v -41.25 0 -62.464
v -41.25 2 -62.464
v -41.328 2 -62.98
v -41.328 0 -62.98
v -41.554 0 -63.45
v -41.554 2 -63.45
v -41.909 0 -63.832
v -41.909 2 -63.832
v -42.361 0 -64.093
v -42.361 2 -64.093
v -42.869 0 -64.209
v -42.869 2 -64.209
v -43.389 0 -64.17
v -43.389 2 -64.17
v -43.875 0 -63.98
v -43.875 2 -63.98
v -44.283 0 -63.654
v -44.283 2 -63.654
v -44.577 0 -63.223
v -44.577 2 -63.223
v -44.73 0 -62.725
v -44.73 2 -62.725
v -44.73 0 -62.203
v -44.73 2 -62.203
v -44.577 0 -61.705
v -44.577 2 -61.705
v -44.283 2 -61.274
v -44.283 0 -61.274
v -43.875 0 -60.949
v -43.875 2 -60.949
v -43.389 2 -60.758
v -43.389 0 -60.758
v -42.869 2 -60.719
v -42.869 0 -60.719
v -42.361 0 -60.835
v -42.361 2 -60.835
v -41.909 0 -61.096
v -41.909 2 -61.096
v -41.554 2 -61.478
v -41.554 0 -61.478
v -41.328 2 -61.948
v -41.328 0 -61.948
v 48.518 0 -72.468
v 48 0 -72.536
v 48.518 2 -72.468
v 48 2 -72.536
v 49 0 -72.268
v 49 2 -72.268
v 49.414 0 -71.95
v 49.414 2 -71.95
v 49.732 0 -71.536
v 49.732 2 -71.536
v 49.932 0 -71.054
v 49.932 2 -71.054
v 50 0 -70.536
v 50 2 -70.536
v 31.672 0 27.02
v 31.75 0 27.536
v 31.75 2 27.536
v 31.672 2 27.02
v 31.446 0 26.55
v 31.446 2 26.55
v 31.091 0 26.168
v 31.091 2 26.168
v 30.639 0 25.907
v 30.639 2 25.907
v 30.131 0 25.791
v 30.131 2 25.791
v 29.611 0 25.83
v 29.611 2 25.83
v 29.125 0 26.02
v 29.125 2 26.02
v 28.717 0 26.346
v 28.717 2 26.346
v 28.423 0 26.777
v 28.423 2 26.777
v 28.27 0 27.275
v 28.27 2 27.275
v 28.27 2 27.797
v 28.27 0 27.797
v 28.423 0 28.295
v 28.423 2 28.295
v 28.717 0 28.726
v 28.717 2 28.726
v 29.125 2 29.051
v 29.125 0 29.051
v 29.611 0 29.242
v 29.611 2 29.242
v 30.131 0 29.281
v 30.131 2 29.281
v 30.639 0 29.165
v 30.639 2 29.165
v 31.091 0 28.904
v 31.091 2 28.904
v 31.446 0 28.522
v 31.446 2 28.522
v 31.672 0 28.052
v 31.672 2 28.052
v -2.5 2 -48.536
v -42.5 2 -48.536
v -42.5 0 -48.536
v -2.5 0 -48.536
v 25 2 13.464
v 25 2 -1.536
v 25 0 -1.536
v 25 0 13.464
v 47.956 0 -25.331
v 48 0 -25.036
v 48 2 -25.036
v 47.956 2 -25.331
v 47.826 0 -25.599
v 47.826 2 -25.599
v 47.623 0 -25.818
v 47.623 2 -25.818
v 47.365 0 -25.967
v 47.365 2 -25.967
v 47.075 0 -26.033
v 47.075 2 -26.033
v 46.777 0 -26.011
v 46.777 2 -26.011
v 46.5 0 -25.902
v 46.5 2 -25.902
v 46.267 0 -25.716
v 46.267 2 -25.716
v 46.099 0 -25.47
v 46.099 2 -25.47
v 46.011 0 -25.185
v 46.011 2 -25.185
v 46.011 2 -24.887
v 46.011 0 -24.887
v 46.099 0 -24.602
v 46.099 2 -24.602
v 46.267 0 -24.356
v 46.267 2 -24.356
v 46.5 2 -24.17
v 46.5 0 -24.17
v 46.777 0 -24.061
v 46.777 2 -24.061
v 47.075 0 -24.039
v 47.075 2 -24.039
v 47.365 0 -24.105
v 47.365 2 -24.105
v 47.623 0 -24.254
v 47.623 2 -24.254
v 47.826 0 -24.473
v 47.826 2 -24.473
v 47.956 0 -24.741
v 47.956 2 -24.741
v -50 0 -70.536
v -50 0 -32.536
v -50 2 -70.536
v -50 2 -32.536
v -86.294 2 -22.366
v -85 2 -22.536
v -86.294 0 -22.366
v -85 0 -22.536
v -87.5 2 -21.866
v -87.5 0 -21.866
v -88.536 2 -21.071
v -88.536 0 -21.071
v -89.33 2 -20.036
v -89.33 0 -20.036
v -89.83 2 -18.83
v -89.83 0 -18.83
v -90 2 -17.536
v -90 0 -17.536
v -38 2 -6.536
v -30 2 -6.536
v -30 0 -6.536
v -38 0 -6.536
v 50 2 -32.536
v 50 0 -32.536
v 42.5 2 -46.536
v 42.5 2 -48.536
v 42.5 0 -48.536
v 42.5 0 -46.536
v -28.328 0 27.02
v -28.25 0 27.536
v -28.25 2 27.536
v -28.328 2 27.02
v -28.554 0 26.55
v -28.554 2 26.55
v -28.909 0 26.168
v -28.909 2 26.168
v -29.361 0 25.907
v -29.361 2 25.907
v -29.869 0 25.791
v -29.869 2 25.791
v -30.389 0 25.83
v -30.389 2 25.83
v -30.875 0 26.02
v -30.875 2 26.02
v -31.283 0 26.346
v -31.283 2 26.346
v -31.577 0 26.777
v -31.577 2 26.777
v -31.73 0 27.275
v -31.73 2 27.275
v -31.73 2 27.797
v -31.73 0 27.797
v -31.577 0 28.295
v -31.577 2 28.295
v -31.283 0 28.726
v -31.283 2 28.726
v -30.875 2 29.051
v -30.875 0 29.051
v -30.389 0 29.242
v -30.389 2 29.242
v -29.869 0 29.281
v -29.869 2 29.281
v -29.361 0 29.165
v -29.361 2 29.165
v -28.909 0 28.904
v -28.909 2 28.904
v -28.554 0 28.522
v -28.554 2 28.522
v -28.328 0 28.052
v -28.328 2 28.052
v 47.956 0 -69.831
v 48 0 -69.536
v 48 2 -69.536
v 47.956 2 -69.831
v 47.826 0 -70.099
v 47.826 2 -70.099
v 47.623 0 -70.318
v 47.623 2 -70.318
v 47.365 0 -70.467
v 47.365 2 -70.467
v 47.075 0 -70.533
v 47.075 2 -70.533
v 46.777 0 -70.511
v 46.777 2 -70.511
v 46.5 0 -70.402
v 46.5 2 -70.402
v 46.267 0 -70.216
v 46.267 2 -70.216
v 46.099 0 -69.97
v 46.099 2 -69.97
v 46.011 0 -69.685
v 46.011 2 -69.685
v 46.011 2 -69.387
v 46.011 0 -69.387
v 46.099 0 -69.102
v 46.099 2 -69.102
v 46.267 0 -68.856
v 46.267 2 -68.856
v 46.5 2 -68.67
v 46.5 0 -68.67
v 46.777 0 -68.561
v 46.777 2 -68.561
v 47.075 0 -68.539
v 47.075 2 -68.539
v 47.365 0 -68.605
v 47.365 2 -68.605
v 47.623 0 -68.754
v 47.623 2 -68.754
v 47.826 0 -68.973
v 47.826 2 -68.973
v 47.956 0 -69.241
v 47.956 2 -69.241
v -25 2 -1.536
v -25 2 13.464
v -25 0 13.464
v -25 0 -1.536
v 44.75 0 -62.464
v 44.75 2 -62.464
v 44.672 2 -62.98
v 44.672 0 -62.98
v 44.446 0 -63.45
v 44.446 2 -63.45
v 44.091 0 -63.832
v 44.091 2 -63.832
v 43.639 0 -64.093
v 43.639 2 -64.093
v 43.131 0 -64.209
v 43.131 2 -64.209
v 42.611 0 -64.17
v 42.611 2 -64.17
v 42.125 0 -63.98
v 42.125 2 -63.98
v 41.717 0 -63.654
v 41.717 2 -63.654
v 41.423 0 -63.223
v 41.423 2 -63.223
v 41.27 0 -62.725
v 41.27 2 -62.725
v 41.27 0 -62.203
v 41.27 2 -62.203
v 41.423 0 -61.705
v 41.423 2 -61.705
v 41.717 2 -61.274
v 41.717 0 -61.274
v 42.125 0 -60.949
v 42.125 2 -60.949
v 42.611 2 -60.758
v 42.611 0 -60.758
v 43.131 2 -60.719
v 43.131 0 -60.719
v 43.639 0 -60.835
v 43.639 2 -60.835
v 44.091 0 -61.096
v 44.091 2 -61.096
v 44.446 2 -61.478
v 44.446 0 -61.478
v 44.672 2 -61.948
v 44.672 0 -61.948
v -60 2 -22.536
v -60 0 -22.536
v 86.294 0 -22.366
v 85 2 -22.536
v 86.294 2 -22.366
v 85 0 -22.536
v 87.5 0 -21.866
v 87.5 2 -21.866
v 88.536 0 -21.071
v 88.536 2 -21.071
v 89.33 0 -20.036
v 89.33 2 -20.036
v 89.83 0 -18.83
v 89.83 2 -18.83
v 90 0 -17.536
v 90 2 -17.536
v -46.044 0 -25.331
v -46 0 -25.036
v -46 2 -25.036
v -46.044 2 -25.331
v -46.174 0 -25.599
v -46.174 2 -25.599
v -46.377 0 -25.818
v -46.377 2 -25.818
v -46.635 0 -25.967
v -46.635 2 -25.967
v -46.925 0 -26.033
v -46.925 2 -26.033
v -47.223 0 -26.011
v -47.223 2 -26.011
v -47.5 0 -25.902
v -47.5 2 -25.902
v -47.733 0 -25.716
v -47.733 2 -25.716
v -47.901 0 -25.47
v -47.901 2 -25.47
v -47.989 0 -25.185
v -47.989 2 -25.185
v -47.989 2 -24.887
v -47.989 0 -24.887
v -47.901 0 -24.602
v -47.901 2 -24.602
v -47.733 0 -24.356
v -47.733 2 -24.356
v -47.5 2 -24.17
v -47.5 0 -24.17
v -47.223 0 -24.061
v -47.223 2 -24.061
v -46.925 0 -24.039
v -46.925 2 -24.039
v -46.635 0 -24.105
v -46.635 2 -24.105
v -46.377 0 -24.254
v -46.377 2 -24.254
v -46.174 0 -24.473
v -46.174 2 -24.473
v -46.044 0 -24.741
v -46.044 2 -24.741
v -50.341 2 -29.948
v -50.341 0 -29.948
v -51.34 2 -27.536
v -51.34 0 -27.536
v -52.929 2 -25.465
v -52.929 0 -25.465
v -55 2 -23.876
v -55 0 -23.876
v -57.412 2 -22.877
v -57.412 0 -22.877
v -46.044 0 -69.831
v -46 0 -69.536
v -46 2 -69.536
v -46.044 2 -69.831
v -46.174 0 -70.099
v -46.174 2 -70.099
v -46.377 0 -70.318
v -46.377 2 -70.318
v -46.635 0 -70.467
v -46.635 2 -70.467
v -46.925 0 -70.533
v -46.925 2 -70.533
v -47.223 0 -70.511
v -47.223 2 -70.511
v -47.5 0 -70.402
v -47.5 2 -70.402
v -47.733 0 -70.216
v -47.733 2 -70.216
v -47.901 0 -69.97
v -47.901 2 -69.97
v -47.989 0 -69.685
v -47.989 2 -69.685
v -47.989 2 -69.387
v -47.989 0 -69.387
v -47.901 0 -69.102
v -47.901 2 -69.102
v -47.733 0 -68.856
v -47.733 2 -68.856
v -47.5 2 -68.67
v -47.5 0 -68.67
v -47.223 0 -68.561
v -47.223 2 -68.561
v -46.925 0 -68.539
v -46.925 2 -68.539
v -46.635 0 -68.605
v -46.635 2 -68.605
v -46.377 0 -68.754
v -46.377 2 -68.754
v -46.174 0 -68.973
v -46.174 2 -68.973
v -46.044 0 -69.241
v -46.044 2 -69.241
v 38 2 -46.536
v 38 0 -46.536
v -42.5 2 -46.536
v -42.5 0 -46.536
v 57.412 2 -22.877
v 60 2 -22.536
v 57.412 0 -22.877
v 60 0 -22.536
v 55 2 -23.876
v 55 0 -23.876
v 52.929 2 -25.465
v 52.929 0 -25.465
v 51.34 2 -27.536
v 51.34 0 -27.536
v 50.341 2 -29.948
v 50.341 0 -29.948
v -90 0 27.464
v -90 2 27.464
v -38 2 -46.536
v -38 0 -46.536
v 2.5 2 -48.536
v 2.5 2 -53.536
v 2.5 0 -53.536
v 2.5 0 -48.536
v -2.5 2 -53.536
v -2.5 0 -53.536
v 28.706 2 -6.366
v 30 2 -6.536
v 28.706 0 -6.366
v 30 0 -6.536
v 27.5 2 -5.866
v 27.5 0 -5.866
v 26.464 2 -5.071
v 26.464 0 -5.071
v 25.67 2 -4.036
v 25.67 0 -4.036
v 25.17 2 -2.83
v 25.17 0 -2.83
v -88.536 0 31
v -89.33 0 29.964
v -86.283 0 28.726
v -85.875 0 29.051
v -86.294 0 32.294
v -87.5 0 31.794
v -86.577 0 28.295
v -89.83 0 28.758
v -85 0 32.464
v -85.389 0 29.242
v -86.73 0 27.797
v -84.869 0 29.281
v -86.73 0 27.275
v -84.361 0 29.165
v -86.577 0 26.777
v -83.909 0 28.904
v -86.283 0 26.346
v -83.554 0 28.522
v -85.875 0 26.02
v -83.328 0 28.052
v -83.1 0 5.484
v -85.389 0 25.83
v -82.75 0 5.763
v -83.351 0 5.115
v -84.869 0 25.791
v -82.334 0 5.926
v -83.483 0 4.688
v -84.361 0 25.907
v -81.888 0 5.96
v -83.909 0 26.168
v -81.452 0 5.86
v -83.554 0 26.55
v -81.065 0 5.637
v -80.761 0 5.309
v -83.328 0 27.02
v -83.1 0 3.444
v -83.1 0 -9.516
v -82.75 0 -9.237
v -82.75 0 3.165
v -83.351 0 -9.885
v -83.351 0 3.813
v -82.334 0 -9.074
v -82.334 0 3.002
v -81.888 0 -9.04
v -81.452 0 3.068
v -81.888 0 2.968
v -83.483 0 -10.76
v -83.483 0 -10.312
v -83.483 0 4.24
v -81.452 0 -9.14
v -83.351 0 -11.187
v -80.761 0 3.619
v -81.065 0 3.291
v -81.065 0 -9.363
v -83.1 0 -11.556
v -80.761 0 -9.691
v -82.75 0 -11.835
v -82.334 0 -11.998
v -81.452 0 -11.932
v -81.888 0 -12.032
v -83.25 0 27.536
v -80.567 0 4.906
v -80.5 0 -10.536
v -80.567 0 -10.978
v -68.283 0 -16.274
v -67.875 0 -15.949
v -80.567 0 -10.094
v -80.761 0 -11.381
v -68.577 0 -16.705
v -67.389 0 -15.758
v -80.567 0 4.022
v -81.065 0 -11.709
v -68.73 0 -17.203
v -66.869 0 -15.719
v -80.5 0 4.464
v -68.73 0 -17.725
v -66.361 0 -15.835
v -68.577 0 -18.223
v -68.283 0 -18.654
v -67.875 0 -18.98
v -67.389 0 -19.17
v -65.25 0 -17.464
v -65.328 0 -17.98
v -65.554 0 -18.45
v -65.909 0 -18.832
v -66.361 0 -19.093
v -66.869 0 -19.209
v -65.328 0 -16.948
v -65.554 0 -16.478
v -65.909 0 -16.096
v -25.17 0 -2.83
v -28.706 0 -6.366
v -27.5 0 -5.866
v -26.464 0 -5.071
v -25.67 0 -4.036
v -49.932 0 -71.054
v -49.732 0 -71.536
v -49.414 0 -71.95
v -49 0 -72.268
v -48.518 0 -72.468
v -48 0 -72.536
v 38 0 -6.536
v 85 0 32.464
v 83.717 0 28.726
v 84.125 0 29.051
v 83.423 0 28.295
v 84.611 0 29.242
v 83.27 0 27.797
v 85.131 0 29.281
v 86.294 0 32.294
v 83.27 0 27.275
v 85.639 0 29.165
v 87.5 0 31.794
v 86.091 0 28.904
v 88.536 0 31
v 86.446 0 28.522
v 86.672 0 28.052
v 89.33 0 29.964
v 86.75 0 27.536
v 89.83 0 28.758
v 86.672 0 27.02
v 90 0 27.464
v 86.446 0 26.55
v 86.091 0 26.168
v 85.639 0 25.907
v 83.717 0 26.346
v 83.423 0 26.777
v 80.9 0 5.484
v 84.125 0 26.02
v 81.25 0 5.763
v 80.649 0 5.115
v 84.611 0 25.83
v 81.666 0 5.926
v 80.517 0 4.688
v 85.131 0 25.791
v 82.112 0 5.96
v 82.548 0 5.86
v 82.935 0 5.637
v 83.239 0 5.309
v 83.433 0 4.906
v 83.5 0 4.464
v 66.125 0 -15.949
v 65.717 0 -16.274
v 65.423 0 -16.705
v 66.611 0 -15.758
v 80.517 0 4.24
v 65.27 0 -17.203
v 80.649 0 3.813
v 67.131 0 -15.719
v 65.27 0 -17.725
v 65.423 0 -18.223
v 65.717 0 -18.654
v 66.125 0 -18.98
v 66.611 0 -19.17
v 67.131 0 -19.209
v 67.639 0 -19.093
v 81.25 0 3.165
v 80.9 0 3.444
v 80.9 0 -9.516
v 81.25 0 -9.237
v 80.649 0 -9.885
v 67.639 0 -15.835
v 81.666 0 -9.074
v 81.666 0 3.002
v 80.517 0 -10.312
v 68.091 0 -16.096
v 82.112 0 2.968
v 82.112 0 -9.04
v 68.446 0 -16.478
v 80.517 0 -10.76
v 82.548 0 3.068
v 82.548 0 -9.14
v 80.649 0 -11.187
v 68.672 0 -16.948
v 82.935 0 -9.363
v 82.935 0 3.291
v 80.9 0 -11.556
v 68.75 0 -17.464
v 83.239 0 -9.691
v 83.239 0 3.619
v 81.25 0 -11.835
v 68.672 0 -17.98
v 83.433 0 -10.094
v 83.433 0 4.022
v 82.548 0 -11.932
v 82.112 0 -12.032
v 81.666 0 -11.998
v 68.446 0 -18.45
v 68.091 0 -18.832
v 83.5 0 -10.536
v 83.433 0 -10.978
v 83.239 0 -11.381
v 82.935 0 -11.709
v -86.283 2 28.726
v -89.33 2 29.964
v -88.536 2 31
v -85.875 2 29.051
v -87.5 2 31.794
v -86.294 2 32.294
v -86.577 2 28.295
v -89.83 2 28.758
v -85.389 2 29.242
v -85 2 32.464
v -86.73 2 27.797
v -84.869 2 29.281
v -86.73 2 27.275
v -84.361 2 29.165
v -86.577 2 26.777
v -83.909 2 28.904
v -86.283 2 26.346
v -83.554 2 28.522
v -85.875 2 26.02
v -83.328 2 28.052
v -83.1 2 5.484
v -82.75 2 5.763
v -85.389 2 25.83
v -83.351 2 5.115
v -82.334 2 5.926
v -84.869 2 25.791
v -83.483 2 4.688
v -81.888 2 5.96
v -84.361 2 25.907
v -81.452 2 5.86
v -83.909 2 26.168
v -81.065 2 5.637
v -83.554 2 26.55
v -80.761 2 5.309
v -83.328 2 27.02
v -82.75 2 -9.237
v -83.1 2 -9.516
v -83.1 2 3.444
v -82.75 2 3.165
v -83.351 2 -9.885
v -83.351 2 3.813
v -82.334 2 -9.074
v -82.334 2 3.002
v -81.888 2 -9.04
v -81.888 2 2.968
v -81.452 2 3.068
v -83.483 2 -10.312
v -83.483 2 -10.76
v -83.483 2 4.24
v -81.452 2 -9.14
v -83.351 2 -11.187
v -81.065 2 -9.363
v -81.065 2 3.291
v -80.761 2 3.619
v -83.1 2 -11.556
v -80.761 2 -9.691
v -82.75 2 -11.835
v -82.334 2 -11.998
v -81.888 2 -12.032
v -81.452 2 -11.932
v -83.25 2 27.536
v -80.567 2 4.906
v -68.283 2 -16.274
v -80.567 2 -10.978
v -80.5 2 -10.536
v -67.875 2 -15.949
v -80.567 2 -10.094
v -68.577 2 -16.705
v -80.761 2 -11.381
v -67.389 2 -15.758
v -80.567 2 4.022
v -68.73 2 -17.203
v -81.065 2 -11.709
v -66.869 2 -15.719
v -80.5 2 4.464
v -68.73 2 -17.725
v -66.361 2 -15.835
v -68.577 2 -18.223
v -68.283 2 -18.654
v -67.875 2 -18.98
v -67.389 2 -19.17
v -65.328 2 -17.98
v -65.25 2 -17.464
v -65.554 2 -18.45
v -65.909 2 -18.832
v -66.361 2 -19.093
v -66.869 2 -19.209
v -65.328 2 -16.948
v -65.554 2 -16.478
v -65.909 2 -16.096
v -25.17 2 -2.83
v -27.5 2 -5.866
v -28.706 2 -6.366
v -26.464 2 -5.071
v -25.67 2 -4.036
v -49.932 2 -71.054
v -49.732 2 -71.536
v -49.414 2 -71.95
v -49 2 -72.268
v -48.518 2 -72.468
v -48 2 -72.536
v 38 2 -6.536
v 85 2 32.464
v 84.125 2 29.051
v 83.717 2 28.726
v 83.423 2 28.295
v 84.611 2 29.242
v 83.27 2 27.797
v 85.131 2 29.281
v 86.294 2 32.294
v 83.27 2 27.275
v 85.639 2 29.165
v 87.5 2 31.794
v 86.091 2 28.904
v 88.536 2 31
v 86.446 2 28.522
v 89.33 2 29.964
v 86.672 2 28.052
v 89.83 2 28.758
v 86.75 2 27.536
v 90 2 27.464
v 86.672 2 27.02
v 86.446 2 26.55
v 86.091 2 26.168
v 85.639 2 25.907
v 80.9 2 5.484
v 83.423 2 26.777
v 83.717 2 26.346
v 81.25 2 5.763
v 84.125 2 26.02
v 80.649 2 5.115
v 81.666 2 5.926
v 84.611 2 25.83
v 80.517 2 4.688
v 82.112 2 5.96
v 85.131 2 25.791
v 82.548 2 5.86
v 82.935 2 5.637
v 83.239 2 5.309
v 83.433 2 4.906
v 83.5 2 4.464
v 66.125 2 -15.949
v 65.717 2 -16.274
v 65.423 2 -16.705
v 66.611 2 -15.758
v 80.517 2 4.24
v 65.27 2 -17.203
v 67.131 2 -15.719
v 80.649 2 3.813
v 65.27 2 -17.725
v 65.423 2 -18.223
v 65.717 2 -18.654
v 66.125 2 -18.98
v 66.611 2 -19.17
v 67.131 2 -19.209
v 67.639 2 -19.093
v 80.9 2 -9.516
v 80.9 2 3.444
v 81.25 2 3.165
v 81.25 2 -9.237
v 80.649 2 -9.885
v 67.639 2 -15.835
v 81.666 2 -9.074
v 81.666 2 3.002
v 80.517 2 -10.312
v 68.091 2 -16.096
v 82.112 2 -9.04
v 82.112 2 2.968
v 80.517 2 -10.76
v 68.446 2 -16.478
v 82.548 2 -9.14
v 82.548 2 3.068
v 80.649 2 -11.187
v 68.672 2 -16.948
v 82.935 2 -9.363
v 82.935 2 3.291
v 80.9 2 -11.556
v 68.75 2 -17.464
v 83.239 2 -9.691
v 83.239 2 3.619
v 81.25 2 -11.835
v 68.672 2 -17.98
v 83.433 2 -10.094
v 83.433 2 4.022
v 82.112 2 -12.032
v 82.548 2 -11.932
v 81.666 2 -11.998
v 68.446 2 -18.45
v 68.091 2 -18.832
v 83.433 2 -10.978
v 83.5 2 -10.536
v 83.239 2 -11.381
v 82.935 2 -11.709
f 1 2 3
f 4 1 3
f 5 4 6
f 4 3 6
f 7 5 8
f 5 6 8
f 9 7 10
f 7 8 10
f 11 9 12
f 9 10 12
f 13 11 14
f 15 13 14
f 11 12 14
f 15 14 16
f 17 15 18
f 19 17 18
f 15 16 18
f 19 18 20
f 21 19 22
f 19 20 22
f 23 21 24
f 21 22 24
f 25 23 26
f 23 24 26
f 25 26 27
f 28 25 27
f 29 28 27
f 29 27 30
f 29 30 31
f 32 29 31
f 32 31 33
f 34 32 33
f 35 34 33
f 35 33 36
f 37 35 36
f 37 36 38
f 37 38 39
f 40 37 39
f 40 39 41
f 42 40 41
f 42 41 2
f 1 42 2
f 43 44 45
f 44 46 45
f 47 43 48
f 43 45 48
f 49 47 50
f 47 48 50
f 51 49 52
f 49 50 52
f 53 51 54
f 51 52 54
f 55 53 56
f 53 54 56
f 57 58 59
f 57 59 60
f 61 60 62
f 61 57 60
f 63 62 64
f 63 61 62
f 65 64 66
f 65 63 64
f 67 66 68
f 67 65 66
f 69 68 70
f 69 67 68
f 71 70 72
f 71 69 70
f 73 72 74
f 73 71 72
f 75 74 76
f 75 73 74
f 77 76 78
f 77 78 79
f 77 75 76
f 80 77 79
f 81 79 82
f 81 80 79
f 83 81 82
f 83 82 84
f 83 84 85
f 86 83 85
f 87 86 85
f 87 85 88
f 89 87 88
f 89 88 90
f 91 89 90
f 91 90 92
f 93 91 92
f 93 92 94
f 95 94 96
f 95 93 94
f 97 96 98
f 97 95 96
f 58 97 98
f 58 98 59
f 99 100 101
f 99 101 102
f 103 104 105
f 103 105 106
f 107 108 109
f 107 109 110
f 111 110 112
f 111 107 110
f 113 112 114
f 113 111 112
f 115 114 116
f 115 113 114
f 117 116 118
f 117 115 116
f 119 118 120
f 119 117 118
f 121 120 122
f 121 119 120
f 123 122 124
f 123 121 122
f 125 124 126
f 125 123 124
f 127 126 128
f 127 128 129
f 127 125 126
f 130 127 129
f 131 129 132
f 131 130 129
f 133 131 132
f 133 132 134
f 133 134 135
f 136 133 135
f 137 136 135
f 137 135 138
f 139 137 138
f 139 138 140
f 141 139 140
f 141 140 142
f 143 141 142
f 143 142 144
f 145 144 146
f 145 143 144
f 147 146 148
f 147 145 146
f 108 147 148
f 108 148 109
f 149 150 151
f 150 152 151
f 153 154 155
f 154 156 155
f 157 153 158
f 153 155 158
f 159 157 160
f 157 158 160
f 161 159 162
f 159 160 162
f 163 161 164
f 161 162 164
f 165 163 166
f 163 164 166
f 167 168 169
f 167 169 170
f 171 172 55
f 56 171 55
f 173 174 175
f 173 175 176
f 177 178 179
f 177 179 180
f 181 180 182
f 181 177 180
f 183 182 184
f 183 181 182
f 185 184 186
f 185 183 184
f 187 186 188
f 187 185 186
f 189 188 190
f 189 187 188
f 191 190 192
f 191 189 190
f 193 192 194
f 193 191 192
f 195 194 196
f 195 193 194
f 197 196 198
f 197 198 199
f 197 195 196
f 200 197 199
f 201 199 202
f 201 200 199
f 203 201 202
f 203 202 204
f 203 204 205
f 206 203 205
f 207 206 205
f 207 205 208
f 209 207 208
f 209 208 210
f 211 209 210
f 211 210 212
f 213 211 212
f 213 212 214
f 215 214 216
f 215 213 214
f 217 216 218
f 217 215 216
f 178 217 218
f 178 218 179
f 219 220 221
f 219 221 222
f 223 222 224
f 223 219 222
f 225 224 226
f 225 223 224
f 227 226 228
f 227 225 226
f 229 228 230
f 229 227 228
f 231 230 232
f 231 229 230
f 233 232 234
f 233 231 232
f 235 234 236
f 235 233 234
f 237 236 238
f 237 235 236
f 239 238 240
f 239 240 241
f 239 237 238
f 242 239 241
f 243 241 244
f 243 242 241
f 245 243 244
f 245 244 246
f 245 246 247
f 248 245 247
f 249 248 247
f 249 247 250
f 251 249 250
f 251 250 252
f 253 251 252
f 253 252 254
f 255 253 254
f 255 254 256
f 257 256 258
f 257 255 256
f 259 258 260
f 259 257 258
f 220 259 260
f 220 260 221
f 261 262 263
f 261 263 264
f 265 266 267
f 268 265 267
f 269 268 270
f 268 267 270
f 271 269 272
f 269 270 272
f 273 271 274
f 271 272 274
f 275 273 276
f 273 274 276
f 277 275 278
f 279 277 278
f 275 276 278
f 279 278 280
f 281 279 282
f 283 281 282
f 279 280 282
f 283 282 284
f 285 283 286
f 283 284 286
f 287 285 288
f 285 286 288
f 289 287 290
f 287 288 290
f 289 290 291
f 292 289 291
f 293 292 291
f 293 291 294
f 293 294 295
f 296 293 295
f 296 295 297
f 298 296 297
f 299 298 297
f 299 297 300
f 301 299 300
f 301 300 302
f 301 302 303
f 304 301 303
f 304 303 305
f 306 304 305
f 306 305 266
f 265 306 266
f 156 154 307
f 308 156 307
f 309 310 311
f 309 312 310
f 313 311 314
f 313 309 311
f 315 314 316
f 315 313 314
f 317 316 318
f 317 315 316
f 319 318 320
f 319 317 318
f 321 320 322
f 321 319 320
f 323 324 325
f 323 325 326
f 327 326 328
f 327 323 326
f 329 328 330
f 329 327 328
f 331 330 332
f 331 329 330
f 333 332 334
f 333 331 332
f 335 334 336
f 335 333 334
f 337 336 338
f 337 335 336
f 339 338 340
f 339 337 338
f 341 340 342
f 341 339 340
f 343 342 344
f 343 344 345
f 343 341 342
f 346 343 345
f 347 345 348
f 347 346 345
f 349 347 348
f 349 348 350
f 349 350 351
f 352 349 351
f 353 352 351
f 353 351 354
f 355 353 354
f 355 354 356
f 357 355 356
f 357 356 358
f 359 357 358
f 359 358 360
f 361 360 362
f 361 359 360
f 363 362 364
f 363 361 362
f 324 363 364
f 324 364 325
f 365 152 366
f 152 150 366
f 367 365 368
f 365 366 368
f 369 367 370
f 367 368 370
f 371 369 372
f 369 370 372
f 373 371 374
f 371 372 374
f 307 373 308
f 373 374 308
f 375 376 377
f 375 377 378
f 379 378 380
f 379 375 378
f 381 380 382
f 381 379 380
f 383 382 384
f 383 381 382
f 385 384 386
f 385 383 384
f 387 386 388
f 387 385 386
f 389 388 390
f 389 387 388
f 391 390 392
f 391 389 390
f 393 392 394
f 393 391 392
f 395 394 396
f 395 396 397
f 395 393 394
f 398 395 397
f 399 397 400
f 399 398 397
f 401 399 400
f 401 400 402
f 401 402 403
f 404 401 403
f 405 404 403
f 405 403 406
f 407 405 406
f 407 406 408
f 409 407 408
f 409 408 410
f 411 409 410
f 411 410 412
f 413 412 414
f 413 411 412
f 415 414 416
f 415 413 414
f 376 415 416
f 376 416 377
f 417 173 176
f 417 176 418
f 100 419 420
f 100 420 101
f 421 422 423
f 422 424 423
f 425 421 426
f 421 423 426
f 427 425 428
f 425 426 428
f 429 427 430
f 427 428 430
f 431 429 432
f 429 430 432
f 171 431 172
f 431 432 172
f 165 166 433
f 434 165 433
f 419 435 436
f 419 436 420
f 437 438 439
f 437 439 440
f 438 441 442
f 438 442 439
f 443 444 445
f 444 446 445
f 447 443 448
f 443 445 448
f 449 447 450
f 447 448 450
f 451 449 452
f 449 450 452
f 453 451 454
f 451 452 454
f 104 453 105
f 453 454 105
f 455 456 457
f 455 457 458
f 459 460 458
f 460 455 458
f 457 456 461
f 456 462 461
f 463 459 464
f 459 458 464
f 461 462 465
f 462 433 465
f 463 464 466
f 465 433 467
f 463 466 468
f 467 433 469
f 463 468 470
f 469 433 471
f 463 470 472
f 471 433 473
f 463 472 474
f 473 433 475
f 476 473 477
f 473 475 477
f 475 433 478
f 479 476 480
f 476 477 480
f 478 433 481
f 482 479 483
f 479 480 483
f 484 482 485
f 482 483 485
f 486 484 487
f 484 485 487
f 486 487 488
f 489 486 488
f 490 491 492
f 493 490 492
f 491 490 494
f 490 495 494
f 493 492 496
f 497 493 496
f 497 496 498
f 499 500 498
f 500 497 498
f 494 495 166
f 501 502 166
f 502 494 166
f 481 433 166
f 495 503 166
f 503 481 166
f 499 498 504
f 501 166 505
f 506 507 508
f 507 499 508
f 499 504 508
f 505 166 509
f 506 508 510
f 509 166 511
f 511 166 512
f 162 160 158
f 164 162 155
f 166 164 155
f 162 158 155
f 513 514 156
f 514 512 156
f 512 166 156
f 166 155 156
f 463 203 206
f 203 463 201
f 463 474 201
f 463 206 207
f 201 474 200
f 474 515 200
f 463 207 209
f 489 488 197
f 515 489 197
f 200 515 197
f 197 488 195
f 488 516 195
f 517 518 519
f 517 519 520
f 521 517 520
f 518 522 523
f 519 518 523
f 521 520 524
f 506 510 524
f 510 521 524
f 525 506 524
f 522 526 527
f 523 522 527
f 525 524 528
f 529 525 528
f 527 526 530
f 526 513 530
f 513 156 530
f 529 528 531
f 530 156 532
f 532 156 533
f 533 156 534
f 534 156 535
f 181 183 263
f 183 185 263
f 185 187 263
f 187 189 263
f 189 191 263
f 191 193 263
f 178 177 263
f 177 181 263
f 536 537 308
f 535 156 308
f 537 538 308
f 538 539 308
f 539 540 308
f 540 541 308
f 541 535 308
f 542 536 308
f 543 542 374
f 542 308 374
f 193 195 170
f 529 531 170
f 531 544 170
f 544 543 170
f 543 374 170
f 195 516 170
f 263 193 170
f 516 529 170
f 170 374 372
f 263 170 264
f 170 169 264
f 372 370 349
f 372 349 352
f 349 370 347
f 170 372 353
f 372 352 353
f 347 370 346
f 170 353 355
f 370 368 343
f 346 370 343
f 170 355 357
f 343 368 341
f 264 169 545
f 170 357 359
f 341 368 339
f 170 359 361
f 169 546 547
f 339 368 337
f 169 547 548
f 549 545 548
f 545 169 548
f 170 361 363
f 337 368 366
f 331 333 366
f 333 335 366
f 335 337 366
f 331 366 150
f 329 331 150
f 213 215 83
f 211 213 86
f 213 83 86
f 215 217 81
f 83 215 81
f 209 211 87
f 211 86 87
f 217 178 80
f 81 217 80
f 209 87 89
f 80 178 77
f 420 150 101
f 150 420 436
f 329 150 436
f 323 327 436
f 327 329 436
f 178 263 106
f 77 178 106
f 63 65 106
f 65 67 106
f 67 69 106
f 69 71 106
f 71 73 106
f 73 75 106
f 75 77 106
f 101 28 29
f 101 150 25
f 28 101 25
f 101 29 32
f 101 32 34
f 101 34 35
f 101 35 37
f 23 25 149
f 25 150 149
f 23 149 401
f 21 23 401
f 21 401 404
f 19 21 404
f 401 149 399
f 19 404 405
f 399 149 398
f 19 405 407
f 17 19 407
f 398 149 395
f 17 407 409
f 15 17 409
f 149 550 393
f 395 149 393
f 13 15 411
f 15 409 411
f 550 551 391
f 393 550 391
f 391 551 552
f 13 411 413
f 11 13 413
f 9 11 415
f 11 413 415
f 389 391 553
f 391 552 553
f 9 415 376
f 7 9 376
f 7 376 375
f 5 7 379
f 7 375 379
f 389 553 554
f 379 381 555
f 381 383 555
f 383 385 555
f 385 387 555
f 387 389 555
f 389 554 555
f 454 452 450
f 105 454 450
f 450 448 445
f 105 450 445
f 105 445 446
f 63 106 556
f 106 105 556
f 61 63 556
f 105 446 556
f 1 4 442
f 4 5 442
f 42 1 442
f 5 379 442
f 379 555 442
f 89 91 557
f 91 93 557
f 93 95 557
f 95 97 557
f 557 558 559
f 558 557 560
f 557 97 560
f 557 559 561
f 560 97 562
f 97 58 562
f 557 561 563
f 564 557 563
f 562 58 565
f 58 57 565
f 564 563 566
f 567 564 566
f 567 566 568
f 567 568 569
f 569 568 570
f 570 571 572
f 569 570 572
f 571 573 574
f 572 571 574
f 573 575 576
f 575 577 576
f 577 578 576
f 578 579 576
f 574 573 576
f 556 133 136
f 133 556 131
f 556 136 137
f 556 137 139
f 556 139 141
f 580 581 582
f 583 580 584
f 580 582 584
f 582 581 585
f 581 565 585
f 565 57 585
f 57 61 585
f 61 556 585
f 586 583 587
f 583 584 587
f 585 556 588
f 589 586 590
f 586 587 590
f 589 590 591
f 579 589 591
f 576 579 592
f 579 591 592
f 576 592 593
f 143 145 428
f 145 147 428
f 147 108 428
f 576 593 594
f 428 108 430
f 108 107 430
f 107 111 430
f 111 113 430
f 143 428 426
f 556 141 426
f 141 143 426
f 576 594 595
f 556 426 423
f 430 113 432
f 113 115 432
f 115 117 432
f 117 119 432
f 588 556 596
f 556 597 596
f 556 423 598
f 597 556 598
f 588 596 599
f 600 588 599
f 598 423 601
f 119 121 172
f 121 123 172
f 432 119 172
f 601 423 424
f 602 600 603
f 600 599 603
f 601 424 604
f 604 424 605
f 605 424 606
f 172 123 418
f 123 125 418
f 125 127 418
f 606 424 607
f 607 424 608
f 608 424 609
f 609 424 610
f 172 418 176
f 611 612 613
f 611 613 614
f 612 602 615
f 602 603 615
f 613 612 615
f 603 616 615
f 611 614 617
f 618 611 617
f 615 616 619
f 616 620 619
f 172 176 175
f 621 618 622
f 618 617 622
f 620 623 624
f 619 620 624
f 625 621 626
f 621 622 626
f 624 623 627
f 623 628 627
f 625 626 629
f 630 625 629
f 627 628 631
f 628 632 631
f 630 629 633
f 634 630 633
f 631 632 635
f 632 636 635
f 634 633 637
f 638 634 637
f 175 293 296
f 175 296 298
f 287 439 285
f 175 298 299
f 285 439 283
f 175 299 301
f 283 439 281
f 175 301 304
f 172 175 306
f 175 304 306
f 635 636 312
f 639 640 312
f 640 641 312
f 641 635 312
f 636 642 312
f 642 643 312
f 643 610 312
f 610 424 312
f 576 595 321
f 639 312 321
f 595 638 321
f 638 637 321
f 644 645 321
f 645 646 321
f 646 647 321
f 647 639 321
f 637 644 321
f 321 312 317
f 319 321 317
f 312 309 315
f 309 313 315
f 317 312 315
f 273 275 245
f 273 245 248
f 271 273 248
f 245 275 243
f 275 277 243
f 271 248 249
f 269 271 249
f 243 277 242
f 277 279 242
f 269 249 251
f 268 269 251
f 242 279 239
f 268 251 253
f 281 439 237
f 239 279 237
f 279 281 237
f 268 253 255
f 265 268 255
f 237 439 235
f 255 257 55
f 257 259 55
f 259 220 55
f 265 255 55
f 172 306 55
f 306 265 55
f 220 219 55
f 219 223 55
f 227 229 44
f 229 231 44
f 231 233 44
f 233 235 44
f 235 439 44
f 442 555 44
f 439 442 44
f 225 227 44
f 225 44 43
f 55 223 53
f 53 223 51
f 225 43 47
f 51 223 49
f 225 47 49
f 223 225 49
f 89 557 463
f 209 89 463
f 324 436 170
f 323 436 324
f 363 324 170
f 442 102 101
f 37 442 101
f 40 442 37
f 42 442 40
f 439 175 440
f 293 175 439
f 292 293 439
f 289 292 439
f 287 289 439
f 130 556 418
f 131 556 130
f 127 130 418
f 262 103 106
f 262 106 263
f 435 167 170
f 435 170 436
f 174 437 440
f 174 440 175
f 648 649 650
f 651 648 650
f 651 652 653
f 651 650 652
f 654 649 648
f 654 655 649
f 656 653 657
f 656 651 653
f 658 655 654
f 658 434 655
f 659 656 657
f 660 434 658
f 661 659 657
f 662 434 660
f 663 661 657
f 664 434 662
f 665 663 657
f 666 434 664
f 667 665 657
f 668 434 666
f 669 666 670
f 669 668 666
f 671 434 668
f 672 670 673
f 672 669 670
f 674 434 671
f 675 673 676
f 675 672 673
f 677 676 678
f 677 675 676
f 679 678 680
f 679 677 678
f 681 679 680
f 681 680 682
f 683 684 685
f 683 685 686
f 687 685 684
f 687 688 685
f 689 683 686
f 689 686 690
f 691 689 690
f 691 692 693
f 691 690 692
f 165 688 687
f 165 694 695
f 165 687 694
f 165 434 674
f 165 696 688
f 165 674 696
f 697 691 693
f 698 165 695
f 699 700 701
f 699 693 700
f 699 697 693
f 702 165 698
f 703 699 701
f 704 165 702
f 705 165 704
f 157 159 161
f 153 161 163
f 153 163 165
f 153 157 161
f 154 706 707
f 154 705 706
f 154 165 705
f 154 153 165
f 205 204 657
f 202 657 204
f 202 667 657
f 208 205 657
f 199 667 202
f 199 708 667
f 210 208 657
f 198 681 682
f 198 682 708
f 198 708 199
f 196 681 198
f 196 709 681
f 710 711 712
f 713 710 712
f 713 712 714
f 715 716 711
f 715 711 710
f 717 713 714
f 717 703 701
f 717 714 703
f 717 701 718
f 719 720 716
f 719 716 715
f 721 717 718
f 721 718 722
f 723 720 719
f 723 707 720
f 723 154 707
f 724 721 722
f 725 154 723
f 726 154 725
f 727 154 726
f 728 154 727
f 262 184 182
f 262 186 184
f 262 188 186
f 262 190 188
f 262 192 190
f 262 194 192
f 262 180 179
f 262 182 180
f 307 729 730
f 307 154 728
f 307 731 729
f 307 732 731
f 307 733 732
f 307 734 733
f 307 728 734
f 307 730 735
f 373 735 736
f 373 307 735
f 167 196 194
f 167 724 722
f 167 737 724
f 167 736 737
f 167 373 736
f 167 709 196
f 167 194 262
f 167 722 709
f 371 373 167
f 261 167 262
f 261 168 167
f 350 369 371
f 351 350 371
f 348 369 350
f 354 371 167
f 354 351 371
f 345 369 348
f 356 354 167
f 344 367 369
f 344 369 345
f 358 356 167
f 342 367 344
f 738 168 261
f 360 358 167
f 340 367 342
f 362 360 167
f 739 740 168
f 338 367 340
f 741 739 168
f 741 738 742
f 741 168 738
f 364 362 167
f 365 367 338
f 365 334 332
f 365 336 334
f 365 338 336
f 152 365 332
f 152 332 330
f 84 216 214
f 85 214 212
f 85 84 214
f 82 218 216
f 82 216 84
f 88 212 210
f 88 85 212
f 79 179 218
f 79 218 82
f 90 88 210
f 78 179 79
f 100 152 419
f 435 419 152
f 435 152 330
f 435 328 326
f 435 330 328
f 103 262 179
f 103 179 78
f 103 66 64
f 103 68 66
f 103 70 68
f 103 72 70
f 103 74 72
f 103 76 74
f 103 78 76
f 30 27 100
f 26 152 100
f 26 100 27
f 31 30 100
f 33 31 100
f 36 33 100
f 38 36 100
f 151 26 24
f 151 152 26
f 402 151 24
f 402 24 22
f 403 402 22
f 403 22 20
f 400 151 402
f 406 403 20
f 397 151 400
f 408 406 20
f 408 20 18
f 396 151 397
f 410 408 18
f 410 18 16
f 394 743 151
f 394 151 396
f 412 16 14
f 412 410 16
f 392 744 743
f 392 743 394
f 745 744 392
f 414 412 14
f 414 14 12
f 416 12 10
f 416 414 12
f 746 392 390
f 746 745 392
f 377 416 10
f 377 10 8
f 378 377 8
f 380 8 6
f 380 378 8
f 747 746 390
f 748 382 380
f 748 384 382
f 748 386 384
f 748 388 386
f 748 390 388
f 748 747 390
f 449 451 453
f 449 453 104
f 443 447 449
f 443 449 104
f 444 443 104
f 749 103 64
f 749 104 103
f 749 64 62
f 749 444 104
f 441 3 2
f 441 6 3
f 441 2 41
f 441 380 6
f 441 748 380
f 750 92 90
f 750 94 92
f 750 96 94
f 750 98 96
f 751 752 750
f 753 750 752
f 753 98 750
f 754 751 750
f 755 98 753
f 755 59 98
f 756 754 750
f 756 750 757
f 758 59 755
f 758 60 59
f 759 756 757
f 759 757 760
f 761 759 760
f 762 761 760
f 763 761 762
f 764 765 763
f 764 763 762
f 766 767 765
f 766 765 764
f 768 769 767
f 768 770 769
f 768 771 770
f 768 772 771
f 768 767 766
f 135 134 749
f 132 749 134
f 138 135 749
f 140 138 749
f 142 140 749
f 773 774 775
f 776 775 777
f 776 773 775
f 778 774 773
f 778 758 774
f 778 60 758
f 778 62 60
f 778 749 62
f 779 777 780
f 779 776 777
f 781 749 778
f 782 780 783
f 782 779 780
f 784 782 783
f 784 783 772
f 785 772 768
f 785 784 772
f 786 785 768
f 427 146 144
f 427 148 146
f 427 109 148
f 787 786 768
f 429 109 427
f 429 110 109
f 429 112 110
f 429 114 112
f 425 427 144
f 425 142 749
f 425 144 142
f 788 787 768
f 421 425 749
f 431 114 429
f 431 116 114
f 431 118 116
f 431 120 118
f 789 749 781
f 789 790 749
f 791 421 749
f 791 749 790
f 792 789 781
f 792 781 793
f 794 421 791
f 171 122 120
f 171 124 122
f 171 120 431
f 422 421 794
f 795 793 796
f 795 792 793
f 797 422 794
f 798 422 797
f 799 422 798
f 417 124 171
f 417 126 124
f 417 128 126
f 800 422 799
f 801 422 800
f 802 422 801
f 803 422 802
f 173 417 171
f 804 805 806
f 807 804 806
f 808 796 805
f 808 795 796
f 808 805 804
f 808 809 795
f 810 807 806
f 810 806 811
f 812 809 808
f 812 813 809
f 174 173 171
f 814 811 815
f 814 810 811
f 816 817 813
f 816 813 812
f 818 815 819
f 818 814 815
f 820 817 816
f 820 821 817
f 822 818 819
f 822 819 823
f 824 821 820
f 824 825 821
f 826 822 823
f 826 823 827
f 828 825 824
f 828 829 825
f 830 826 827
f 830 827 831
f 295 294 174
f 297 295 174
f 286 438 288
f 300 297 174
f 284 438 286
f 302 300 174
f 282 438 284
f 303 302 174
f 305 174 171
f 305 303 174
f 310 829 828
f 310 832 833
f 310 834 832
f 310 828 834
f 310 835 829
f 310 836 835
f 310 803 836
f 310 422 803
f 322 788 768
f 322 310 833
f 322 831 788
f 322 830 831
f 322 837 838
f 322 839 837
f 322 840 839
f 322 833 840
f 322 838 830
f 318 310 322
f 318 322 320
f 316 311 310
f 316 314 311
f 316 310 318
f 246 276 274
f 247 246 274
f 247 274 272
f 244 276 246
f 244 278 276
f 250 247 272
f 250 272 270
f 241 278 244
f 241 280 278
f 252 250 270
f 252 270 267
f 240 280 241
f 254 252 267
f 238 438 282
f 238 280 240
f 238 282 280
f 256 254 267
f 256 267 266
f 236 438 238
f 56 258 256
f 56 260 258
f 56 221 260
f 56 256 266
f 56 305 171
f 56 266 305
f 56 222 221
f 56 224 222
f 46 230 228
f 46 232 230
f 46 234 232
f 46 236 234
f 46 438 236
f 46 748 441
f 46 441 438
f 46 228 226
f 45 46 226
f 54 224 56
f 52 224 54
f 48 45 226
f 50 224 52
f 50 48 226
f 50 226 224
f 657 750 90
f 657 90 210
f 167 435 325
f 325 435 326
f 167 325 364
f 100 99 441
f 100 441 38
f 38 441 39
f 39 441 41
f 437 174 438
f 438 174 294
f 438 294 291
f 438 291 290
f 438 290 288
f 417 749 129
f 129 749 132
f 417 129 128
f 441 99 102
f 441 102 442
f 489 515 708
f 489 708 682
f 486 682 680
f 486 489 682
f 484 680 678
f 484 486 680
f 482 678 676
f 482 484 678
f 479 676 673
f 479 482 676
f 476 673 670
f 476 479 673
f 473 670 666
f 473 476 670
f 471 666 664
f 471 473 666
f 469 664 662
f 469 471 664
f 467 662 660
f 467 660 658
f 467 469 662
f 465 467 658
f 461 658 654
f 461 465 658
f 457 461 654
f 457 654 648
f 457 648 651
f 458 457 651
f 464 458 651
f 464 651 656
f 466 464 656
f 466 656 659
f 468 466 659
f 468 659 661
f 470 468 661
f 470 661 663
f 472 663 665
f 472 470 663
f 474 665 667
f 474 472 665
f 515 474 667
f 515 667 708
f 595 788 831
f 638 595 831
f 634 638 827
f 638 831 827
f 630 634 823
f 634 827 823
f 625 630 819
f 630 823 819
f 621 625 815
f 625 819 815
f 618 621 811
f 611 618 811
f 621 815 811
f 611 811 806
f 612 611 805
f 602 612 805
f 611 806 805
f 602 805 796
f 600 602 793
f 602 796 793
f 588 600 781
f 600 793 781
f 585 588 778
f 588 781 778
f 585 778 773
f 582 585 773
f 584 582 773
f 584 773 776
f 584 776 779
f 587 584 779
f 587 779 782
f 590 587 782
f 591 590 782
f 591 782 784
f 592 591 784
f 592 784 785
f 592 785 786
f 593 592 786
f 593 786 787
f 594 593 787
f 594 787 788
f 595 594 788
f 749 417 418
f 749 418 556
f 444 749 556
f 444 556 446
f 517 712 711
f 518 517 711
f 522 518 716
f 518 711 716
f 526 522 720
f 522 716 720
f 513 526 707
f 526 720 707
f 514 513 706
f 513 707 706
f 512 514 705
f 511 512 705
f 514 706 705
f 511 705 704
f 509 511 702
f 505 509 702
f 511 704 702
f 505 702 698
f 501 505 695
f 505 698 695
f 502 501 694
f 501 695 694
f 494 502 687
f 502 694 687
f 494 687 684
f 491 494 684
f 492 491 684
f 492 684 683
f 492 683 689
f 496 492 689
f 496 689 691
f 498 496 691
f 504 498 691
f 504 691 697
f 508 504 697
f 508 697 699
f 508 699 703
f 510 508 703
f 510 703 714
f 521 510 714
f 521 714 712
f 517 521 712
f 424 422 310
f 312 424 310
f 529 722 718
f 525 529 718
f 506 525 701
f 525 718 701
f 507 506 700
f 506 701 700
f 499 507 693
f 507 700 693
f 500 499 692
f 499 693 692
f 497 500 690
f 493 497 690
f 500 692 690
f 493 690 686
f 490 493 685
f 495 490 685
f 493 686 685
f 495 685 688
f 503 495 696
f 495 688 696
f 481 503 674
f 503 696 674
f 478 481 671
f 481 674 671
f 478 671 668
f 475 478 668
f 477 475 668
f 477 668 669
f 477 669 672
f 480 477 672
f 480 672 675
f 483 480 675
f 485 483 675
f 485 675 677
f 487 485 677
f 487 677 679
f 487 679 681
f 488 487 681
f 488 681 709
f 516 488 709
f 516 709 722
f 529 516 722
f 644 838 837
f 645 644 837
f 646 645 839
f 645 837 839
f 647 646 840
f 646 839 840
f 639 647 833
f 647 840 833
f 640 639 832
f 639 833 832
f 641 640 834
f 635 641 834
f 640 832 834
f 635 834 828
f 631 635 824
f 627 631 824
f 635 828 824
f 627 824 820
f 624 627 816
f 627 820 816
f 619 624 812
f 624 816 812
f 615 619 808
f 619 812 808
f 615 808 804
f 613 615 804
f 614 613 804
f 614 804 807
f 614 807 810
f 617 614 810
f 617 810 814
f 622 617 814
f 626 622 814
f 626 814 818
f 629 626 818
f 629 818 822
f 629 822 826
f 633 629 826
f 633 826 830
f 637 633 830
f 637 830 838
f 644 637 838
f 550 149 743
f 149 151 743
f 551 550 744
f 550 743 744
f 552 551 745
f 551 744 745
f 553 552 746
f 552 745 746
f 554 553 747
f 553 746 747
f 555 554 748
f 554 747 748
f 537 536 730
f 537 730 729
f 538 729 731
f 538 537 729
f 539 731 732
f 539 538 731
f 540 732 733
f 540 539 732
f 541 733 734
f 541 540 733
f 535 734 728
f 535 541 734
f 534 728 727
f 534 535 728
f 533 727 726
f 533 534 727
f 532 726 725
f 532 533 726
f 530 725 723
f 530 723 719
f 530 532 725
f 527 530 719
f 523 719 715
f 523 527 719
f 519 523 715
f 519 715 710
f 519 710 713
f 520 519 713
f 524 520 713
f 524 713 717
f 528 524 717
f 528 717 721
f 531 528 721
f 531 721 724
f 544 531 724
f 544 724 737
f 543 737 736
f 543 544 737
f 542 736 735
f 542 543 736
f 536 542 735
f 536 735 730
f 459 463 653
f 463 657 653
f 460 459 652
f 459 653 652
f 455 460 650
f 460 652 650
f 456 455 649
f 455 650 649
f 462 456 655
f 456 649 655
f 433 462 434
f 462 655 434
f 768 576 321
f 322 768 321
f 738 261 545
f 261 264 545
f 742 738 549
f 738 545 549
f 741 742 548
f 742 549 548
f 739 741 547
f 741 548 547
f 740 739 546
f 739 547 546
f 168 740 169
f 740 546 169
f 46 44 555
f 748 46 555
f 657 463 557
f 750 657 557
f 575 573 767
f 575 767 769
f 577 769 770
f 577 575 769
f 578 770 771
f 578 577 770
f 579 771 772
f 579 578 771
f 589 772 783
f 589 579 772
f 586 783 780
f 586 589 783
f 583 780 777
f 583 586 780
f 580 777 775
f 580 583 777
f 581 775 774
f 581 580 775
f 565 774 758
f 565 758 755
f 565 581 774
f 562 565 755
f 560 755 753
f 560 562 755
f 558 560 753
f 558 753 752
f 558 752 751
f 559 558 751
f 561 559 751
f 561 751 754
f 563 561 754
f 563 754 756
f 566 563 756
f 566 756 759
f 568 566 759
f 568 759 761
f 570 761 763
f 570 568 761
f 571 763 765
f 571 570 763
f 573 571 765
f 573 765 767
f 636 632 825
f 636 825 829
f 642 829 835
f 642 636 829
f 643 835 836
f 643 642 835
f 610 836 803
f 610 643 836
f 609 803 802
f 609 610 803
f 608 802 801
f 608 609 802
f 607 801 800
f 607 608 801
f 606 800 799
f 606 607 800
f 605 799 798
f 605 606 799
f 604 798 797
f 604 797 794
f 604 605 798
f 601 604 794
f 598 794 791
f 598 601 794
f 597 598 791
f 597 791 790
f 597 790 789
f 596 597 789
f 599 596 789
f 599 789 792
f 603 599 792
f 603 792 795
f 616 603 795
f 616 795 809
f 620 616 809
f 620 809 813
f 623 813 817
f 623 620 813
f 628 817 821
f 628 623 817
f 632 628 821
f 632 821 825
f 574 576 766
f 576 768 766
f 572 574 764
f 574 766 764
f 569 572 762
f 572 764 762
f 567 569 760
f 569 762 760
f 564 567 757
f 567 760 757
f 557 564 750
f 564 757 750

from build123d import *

# Parameters (mm, degrees)
SKETCH1_R           = 1.75
SKETCH1_R_2         = 1
BOSS_EXTRUDE1_DEPTH = 2
SKETCH3_R           = 1.75
SKETCH3_W           = 40
SKETCH3_H           = 10
CUT_EXTRUDE2_DEPTH  = 10
FILLET1_R           = 2
FILLET2_R           = 5
FILLET3_R           = 10
SKETCH4_R           = 1.5
CUT_EXTRUDE3_DEPTH  = 10


with BuildPart() as part:
    # Sketch1 → Boss-Extrude1 (new body)
    with BuildSketch(Plane(origin=(0, 0, 0), x_dir=(1, 0, 0), z_dir=(0, 1, 0))):
        Polygon((-90, 32.535953793), (-90, -32.464046207), (90, -32.464046207), (90, 32.535953793), (50, 32.535953793), (50, 72.535953793), (-50, 72.535953793), (-50, 32.535953793), align=None)
        with Locations((-85, -27.535953793)):
            Circle(SKETCH1_R, mode=Mode.SUBTRACT)
        with Locations((85, -27.535953793)):
            Circle(SKETCH1_R, mode=Mode.SUBTRACT)
        with Locations((-30, -27.535953793)):
            Circle(SKETCH1_R, mode=Mode.SUBTRACT)
        with Locations((30, -27.535953793)):
            Circle(SKETCH1_R, mode=Mode.SUBTRACT)
        with Locations((-67, 17.464046207)):
            Circle(SKETCH1_R, mode=Mode.SUBTRACT)
        with Locations((67, 17.464046207)):
            Circle(SKETCH1_R, mode=Mode.SUBTRACT)
        with Locations((-47, 69.535953793)):
            Circle(SKETCH1_R_2, mode=Mode.SUBTRACT)
        with Locations((-47, 25.035953793)):
            Circle(SKETCH1_R_2, mode=Mode.SUBTRACT)
        with Locations((47, 25.035953793)):
            Circle(SKETCH1_R_2, mode=Mode.SUBTRACT)
        with Locations((47, 69.535953793)):
            Circle(SKETCH1_R_2, mode=Mode.SUBTRACT)
    extrude(amount=BOSS_EXTRUDE1_DEPTH)

    # Sketch3 → Cut-Extrude2 (cut)
    with BuildSketch(Plane(origin=(0, 2, 0), x_dir=(1, 0, 0), z_dir=(0, 1, 0))):
        with Locations((-43, 62.464046207)):
            Circle(SKETCH3_R)
        with Locations((43, 62.464046207)):
            Circle(SKETCH3_R)
        Polygon((2.5, 48.535953793), (42.5, 48.535953793), (42.5, 46.535953793), (38, 46.535953793), (38, 6.535953793), (25, 6.535953793), (25, -13.464046207), (-25, -13.464046207), (-25, 6.535953793), (-38, 6.535953793), (-38, 46.535953793), (-42.5, 46.535953793), (-42.5, 48.535953793), (-2.5, 48.535953793), (-2.5, 53.535953793), (2.5, 53.535953793), align=None)
        with Locations((70, 27.535953793)):
            Rectangle(SKETCH3_W, SKETCH3_H)
        with Locations((-70, 27.535953793)):
            Rectangle(SKETCH3_W, SKETCH3_H)
    extrude(amount=-CUT_EXTRUDE2_DEPTH, mode=Mode.SUBTRACT)

    # Fillet1
    fillet1_edges = [part.edges().sort_by_distance(p)[0] for p in [
        (-50, 1, -72.535953793),
        (50, 1, -72.535953793),
    ]]
    fillet(fillet1_edges, radius=FILLET1_R)

    # Fillet2
    fillet2_edges = [part.edges().sort_by_distance(p)[0] for p in [
        (90, 1, -22.535953793),
        (25, 1, -6.535953793),
        (-25, 1, -6.535953793),
        (90, 1, 32.464046207),
        (-90, 1, 32.464046207),
        (-90, 1, -22.535953793),
    ]]
    fillet(fillet2_edges, radius=FILLET2_R)

    # Fillet3
    fillet3_edges = [part.edges().sort_by_distance(p)[0] for p in [
        (50, 1, -22.535953793),
        (-50, 1, -22.535953793),
    ]]
    fillet(fillet3_edges, radius=FILLET3_R)

    # Sketch4 → Cut-Extrude3 (cut)
    with BuildSketch(Plane(origin=(0, 2, 0), x_dir=(1, 0, 0), z_dir=(0, 1, 0))):
        with Locations((-82, 10.535953793)):
            Circle(SKETCH4_R)
        with Locations((-82, -4.464046207)):
            Circle(SKETCH4_R)
        with Locations((82, 10.535953793)):
            Circle(SKETCH4_R)
        with Locations((82, -4.464046207)):
            Circle(SKETCH4_R)
    extrude(amount=-CUT_EXTRUDE3_DEPTH, mode=Mode.SUBTRACT)


solid = part.part
